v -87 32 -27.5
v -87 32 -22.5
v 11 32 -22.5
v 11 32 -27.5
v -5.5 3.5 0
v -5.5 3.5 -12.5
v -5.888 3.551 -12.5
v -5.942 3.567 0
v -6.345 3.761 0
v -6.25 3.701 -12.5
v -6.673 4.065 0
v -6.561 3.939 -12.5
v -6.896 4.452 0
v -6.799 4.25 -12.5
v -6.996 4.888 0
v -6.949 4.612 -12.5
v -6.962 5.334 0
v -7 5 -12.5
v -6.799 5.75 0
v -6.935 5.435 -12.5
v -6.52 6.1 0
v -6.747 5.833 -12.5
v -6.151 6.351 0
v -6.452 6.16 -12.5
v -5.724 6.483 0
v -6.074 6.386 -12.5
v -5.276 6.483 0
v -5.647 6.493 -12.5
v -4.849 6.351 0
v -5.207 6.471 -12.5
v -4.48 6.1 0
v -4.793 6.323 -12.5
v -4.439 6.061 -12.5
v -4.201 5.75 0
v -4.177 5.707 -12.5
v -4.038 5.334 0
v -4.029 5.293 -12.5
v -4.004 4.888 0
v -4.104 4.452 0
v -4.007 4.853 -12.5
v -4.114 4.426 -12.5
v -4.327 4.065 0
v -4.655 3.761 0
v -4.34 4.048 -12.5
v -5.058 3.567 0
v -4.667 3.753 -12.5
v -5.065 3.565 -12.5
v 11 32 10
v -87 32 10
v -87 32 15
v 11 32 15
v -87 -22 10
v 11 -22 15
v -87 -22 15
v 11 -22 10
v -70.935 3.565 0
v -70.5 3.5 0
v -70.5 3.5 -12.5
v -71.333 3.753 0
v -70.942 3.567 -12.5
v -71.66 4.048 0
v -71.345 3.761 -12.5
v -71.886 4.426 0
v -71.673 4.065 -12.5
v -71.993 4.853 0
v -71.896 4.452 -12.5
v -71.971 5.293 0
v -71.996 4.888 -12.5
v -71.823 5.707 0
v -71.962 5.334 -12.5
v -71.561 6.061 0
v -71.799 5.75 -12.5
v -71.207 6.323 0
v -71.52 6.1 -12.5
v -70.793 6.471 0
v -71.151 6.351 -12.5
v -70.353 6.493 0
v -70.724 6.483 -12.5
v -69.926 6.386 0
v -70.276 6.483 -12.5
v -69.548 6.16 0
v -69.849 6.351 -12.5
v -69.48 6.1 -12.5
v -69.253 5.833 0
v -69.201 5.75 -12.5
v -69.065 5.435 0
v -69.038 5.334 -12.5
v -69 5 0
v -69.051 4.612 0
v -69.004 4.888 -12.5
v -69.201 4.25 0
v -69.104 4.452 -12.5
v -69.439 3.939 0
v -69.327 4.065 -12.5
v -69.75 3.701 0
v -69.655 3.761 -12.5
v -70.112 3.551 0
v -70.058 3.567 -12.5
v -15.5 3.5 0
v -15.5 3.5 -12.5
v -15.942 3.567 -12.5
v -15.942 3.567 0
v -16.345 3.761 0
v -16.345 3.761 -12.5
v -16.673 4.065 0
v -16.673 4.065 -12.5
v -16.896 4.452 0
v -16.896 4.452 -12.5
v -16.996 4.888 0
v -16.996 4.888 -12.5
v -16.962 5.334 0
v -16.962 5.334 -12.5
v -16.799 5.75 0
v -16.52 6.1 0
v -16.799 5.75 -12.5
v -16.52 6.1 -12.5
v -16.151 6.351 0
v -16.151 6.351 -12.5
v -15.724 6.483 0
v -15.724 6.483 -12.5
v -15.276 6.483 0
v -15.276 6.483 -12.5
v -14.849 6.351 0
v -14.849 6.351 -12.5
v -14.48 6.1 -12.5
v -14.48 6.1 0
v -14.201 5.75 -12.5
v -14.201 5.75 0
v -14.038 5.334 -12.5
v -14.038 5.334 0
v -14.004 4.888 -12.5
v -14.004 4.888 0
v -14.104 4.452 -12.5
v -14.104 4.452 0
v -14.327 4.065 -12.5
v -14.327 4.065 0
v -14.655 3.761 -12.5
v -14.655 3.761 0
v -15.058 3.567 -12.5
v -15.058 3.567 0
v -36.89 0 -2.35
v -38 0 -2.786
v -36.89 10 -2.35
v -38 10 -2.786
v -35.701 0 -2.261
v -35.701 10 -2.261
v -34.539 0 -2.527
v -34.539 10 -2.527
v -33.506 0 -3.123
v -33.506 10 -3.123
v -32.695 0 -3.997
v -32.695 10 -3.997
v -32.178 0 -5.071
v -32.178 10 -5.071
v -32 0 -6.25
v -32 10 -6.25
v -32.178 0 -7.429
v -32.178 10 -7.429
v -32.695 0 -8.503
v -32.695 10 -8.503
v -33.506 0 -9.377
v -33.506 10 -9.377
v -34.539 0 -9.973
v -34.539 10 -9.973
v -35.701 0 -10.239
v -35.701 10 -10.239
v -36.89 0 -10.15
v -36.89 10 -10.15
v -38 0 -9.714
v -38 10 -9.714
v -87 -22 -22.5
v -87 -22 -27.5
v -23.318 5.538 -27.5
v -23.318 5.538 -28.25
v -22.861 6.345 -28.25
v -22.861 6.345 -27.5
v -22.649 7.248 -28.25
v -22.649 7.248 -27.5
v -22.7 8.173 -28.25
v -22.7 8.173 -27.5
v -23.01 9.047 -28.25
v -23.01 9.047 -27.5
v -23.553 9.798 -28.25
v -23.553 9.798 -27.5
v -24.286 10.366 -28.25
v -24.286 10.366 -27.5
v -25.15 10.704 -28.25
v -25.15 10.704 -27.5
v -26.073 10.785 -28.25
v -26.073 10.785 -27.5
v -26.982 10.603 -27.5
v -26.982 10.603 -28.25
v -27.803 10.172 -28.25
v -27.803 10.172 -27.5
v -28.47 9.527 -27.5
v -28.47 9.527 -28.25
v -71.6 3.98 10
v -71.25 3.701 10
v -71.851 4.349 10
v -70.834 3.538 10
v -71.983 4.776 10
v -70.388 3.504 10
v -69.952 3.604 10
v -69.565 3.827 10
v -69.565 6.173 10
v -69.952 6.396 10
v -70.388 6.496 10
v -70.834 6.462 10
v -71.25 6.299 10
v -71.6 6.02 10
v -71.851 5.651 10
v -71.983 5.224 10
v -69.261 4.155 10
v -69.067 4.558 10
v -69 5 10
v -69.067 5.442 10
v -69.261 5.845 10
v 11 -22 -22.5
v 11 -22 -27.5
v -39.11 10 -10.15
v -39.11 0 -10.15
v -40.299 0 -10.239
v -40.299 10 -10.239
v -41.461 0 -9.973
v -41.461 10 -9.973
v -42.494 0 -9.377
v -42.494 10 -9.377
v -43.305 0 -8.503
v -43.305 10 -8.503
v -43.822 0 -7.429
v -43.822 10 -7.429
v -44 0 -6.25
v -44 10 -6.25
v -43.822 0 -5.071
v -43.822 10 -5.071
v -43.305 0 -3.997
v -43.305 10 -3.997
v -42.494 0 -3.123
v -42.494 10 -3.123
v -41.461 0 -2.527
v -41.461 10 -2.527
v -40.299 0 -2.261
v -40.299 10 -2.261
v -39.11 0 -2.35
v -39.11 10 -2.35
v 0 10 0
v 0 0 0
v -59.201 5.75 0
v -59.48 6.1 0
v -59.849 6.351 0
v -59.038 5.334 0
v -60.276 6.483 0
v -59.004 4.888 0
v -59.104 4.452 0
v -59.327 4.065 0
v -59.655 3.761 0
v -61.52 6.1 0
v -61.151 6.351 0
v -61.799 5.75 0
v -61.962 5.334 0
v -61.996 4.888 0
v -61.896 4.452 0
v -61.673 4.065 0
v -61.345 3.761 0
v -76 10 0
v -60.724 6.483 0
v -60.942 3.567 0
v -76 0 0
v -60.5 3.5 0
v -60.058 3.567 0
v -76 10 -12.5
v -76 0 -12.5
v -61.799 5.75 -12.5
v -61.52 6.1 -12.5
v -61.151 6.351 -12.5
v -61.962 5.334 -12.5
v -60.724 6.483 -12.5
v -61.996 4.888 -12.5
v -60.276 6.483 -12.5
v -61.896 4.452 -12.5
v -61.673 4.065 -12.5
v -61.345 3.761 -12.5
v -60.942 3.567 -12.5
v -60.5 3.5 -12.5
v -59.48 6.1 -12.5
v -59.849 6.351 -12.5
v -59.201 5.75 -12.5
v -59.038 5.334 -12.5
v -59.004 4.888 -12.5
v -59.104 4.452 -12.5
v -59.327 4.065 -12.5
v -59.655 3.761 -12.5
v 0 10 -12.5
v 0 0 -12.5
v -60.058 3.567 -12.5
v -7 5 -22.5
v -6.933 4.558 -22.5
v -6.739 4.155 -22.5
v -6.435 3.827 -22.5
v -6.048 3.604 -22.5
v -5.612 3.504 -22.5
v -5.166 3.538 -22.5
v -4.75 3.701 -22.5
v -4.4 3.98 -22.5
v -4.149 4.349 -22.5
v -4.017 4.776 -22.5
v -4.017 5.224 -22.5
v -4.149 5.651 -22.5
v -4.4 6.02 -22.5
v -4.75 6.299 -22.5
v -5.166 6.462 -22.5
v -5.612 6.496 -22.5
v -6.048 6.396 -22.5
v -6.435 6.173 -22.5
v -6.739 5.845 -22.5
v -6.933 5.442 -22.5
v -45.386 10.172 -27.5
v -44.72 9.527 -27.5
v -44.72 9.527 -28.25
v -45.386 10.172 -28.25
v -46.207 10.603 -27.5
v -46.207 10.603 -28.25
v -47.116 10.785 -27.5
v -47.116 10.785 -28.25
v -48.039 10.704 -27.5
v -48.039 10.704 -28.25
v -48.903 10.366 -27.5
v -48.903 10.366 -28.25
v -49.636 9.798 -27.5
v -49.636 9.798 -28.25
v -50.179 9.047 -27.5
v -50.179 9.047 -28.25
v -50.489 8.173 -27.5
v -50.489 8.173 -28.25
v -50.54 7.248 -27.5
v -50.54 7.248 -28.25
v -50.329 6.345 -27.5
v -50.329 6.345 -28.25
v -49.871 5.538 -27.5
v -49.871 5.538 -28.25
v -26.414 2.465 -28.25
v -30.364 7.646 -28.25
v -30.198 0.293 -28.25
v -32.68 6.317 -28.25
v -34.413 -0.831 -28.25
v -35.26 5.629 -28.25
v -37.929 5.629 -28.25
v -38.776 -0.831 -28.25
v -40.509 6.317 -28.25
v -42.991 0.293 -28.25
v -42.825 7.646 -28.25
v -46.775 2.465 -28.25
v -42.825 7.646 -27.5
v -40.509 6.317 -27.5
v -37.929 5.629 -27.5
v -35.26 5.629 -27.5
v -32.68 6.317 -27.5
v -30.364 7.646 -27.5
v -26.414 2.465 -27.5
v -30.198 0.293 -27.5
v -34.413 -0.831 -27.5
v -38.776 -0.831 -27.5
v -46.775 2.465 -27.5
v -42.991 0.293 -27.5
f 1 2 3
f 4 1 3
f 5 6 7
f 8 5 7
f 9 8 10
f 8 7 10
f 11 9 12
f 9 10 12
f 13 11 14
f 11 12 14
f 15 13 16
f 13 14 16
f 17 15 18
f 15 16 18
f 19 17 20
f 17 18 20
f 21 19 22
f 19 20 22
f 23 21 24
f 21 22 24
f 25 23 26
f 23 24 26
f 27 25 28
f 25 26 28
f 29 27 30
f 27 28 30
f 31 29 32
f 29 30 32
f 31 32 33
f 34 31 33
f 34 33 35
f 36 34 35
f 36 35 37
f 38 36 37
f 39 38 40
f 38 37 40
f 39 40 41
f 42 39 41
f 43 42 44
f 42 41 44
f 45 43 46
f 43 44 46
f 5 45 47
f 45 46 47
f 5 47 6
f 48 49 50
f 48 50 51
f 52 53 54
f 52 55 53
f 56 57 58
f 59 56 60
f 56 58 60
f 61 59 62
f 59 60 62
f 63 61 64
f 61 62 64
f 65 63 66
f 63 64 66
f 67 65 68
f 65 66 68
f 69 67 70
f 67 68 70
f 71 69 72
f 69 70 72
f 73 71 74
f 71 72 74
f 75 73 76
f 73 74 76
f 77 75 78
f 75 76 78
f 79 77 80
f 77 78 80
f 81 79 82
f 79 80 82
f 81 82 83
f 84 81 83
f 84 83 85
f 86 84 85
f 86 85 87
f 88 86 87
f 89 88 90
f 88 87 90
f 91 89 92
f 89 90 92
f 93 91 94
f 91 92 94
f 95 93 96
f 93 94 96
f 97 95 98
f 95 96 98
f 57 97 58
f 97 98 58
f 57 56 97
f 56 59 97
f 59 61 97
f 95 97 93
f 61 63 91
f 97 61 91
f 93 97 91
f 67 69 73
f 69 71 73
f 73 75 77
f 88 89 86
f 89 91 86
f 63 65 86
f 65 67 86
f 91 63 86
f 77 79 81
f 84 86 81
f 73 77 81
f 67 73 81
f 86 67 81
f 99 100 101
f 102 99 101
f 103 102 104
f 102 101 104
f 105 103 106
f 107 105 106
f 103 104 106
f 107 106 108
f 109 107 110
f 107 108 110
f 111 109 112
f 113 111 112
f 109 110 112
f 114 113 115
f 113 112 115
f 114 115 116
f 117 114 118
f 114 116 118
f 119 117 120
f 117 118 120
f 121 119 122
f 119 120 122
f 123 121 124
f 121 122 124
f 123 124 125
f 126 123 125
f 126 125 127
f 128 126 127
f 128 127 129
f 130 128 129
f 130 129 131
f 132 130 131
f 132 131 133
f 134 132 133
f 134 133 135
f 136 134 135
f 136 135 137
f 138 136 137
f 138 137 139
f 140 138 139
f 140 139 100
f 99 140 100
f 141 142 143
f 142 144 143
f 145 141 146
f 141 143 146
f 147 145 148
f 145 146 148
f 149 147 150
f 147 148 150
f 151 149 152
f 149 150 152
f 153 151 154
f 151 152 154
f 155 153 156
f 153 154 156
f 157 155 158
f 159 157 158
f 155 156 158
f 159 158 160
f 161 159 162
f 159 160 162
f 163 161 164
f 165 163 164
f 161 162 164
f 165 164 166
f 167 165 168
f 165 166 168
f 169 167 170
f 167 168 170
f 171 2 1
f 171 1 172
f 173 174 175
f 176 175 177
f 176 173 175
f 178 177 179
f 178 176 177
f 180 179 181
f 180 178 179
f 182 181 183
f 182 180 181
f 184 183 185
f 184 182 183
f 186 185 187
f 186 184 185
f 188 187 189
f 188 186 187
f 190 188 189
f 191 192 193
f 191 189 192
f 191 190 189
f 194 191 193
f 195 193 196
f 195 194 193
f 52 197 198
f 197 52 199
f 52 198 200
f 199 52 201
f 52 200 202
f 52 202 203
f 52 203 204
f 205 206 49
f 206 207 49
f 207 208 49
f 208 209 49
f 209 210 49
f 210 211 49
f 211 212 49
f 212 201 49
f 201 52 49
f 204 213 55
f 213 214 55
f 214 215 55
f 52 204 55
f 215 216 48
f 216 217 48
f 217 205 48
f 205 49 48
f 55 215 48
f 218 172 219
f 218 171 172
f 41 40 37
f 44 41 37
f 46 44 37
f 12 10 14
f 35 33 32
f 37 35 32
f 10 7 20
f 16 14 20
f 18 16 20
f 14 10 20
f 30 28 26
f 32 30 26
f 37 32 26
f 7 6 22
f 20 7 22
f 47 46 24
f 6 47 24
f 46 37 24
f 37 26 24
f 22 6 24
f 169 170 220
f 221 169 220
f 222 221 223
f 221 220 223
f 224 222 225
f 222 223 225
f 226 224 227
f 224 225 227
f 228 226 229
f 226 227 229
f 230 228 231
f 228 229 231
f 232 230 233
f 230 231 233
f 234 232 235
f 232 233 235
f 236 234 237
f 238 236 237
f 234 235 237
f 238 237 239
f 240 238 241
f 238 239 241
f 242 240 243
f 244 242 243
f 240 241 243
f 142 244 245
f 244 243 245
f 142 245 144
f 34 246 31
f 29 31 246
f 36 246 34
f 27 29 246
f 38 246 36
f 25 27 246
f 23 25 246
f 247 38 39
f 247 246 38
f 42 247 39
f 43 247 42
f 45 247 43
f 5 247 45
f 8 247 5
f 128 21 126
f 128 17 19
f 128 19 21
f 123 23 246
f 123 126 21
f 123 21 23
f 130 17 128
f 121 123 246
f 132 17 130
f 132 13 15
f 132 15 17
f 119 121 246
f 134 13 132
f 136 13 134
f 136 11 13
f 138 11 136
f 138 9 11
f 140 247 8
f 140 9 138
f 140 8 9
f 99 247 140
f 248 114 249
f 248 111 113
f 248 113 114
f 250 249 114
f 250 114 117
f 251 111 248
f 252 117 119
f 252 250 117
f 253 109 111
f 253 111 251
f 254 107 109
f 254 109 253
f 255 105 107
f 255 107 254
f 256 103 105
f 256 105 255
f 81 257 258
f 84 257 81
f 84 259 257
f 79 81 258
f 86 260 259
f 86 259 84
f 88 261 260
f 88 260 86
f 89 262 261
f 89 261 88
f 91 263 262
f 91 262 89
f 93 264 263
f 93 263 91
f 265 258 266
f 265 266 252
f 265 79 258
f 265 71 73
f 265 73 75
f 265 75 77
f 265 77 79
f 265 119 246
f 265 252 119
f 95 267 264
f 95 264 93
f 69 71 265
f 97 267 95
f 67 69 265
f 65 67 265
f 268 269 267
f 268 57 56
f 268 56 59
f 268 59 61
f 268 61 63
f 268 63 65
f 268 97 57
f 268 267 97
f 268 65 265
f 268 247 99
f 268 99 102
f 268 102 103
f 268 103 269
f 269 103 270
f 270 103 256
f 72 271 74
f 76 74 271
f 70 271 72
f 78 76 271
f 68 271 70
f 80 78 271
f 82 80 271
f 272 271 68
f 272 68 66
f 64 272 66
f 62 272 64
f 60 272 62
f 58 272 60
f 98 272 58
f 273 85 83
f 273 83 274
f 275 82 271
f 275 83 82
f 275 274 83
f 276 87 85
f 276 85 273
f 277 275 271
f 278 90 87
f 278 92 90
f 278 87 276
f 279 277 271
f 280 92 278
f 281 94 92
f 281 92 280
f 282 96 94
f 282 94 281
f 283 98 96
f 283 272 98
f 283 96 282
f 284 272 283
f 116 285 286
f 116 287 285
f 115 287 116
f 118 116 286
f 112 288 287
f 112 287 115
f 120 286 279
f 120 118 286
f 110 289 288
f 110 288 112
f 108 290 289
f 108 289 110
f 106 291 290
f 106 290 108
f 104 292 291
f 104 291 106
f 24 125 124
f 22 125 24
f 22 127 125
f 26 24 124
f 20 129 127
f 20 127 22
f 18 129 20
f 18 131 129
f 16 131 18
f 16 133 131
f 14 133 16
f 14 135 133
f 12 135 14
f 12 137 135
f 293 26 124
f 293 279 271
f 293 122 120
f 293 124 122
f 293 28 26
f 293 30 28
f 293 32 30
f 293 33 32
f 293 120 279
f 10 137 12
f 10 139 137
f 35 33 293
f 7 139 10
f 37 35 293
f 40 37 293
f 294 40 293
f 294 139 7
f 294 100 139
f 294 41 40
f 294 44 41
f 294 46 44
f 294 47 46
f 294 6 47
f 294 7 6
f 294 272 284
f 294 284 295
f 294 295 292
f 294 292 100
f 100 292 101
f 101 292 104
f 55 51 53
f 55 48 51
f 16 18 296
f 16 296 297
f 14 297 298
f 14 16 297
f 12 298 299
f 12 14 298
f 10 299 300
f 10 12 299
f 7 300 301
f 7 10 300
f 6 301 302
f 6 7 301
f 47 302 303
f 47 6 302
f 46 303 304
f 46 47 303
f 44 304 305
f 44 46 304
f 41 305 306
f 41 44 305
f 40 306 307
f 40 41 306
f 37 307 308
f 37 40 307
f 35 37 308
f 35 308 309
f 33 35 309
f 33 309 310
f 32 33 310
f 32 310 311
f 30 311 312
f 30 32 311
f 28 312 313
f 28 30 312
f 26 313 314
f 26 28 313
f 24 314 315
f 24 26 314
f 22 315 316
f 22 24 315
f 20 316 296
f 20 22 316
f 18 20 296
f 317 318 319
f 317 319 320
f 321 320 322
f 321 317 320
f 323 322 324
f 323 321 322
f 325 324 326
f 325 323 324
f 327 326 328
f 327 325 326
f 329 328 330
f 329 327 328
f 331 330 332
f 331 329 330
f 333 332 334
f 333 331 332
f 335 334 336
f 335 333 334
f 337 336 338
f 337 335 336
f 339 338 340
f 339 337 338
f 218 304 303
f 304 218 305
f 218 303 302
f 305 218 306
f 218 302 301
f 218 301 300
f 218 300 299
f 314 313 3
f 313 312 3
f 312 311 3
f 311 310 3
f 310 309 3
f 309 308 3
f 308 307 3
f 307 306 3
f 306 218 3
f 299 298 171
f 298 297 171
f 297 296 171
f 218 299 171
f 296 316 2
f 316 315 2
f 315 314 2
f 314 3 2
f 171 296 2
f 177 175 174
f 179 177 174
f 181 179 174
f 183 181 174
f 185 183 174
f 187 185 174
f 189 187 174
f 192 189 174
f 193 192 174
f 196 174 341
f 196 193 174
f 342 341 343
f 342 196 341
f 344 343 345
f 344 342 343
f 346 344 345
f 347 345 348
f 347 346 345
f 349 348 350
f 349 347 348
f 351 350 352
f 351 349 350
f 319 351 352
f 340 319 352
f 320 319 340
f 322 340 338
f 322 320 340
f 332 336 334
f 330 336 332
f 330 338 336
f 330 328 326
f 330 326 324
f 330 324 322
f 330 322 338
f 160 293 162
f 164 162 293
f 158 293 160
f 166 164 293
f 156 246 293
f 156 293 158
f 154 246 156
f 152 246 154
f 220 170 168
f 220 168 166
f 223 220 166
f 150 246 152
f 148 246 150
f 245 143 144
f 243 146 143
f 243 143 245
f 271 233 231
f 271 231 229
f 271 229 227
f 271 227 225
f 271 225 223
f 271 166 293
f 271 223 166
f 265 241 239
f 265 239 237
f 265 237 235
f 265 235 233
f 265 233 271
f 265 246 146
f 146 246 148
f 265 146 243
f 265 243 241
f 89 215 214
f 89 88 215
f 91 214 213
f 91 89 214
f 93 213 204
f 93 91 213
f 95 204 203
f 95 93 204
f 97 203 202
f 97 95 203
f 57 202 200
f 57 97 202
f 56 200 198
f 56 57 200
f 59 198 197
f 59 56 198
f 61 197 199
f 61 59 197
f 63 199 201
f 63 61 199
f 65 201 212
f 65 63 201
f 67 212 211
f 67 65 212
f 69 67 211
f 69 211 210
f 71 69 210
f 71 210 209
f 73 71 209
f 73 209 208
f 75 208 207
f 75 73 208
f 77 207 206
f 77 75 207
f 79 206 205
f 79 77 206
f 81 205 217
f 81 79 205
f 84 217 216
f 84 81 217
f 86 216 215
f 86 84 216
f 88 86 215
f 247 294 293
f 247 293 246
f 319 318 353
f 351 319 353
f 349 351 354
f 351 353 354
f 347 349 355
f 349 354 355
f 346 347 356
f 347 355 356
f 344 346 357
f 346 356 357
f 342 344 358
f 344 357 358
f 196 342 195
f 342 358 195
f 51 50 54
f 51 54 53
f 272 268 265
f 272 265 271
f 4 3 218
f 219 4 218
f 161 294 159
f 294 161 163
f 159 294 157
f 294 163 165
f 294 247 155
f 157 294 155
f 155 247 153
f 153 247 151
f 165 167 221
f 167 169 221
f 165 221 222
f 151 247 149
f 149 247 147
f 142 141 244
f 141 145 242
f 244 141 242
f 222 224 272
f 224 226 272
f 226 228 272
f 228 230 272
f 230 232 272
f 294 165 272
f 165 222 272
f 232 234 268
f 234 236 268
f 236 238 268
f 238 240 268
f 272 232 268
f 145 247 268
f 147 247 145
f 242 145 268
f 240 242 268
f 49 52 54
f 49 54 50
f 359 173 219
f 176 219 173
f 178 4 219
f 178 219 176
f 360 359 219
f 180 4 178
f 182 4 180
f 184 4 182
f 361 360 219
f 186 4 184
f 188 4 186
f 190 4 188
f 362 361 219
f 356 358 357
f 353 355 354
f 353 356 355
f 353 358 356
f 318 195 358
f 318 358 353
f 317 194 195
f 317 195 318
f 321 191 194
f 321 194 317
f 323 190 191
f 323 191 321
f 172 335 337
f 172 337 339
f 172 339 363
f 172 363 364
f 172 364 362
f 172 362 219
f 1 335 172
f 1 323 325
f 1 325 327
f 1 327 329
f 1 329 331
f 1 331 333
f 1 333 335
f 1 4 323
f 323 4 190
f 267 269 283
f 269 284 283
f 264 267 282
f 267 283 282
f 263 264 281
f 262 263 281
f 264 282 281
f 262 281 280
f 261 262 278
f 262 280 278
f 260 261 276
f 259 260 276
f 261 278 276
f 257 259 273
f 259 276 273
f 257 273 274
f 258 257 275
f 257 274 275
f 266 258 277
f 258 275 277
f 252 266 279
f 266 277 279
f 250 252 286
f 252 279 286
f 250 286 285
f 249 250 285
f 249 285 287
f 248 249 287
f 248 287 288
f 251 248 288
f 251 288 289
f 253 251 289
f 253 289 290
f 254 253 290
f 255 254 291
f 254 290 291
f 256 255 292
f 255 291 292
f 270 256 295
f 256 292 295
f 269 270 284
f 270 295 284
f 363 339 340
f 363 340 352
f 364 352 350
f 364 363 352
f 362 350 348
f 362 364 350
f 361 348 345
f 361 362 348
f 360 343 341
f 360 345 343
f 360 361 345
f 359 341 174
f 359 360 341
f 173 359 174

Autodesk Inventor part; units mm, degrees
ref_plane "YZ Plane" through (0, 0, 0) normal (1, 0, 0) x (0, 1, 0)
ref_plane "XZ Plane" through (0, 0, 0) normal (0, 1, 0) x (-1, 0, 0)
ref_plane "XY Plane" through (0, 0, 0) normal (0, 0, 1) x (1, 0, 0)
sketch "loadcell" plane through (0, 0, 0) normal (0, 1, 0) x (-1, 0, 0)
  line L0 (0, 0) -> (76, 0)
  line L1 (76, 0) -> (76, -12.5)
  line L2 (76, -12.5) -> (0, -12.5)
  line L3 (0, -12.5) -> (0, 0)
  point P0 (38, -6.25)
  dimension "d0" = 76
  dimension "d1" = 12.5
extrude "Base" add sketch "loadcell" along normal blind 10
sketch "Sketch3" plane through (0, 10, 0) normal (0, 1, 0) x (1, 0, 0)
  line L0 (-76, 12.5) -> (-76, 0) projected
  line L1 (-76, 6.25) -> (0, 6.25)
  line L2 (0, 12.5) -> (-76, 12.5) projected
  line L3 (-38, 12.5) -> (-38, 0)
  circle A0 centre (-36, 6.25) radius 4
  circle A1 centre (-40, 6.25) radius 4
  point P0 (0, 0)
  point P1 (-38, 6.25)
  point P2 (-38, 9.7141)
  point P3 (-38, 6.25)
  dimension "d4" = 8
  dimension "d5" = 8
  dimension "d8" = 2
  dimension "d9" = 2
extrude "Furo" cut sketch "Sketch3" against normal blind 10 contours A1 A0 L1 | L1 A0 A1 | A1 L1 L3 | L3 L1 A0 | A0 L1 A1 | L1 L3 A0 | A1 L1 A0 | L3 L1 A1
sketch "Sketch2" plane through (0, 10, 0) normal (0, 1, 0) x (1, 0, 0)
  line L0 (-76, 12.5) -> (-76, 0) projected
  line L1 (0, 0) -> (0, 12.5) projected
  point P0 (-38, 6.25)
sketch "Sketch4" plane through (-76, 0, 0) normal (0, 0, 1) x (1, 0, 0)
  line L0 (76, 0) -> (76, 10) projected
  line L1 (0, 0) -> (0, 10) projected
  line L2 (76, 10) -> (0, 10) projected
  line L3 (76, 0) -> (0, 0) projected
  line L4 (0, 0) -> (0, 10) projected
  line L5 (38, 10) -> (38, 0)
  point P0 (38, 5)
  point P1 (5.5, 5)
  point P2 (15.5, 5)
  point P3 (0, 5)
  point P4 (0, 5)
  point P5 (70.5, 5)
  point P6 (60.5, 5)
  dimension "d12" = 5.5
  dimension "d13" = 15.5
hole "Hole1" at (-70.5, 5, 0) at (-60.5, 5, 0) direction (0, 0, -1) diameter 3 end through all
thread "Thread1" size "M3x0.5" class "6H" standard "ANSI Metric M Profile" full length
thread "Thread2" size "M3x0.5" class "6H" standard "ANSI Metric M Profile" full length
thread "Thread3" size "M3x0.5" class "6H" standard "ANSI Metric M Profile" full length
hole "Hole2" at (-15.5, 5, 0) at (-5.5, 5, 0) direction (0, 0, -1) diameter 3 end through all
thread "Thread4" size "M3x0.5" class "6H" standard "ANSI Metric M Profile" full length
thread "Thread5" size "M3x0.5" class "6H" standard "ANSI Metric M Profile" full length
sketch "pino_de_baixo" plane through (-76, 0, 0) normal (0, 0, 1) x (1, 0, 0)
  circle A0 centre (5.5, 5) radius 1.5 projected
  circle A1 centre (5.5, 5) radius 1.5
  point P0 (76, 0)
extrude "parafuso/pino" add sketch "pino_de_baixo" along normal blind 10
sketch "Sketch6" plane through (-70.5, 5, 10) normal (0, 0, 1) x (1, 0, 0)
  line L0 (-16.5, 27) -> (81.5, 27)
  line L1 (81.5, 27) -> (81.5, -27)
  line L2 (81.5, -27) -> (-16.5, -27)
  line L3 (-16.5, -27) -> (-16.5, 27)
  dimension "d48" = 98
  dimension "d49" = 54
extrude "Extrusion4" add sketch "Sketch6" along normal blind 5
sketch "pino/furo/ima" plane through (0, 0, -12.5) normal (0, 0, -1) x (-1, 0, 0)
  circle A0 centre (5.5, 5) radius 1.5 projected
  circle A1 centre (5.5, 5) radius 1.5
  point P0 (0, 0)
extrude "Extrusion5" add sketch "pino/furo/ima" along normal blind 10
sketch "Sketch8" plane through (-5.5, 5, -22.5) normal (0, 0, -1) x (-1, 0, 0)
  line L0 (81.5, -27) -> (-16.5, -27) projected
  line L1 (81.5, 27) -> (81.5, -27) projected
  line L2 (-16.5, -27) -> (81.5, -27)
  line L3 (81.5, -27) -> (81.5, 27)
  line L4 (81.5, 27) -> (-16.5, 27)
  line L5 (-16.5, 27) -> (-16.5, -27)
  point P0 (-5.5, -5)
extrude "Extrusion6" add sketch "Sketch8" along normal blind 5
sketch "ima-neodimio" plane through (-5.5, 5, -27.5) normal (0, 0, -1) x (-1, 0, 0)
  line L0 (32.5, 5) -> (32.5, -5) projected
  arc A0 (32.5, -5) -> (53.9014, -5) centre (43.2007, 3.2853) ccw construction
  arc A1 (17.8181, 0.5384) -> (44.371, 0.5384) centre (31.0945, 10.818) ccw
  arc A2 (22.9696, 4.5271) -> (39.2195, 4.5271) centre (31.0945, 10.818) ccw
  arc A3 (22.9696, 4.5271) -> (17.8181, 0.5384) centre (20.3939, 2.5327) ccw
  arc A4 (44.371, 0.5384) -> (39.2195, 4.5271) centre (41.7952, 2.5327) ccw
extrude "Extrusion7" add sketch "ima-neodimio" along normal mid plane 1.5
properties part number "load_cell" material "Acetal Resin, Black"
